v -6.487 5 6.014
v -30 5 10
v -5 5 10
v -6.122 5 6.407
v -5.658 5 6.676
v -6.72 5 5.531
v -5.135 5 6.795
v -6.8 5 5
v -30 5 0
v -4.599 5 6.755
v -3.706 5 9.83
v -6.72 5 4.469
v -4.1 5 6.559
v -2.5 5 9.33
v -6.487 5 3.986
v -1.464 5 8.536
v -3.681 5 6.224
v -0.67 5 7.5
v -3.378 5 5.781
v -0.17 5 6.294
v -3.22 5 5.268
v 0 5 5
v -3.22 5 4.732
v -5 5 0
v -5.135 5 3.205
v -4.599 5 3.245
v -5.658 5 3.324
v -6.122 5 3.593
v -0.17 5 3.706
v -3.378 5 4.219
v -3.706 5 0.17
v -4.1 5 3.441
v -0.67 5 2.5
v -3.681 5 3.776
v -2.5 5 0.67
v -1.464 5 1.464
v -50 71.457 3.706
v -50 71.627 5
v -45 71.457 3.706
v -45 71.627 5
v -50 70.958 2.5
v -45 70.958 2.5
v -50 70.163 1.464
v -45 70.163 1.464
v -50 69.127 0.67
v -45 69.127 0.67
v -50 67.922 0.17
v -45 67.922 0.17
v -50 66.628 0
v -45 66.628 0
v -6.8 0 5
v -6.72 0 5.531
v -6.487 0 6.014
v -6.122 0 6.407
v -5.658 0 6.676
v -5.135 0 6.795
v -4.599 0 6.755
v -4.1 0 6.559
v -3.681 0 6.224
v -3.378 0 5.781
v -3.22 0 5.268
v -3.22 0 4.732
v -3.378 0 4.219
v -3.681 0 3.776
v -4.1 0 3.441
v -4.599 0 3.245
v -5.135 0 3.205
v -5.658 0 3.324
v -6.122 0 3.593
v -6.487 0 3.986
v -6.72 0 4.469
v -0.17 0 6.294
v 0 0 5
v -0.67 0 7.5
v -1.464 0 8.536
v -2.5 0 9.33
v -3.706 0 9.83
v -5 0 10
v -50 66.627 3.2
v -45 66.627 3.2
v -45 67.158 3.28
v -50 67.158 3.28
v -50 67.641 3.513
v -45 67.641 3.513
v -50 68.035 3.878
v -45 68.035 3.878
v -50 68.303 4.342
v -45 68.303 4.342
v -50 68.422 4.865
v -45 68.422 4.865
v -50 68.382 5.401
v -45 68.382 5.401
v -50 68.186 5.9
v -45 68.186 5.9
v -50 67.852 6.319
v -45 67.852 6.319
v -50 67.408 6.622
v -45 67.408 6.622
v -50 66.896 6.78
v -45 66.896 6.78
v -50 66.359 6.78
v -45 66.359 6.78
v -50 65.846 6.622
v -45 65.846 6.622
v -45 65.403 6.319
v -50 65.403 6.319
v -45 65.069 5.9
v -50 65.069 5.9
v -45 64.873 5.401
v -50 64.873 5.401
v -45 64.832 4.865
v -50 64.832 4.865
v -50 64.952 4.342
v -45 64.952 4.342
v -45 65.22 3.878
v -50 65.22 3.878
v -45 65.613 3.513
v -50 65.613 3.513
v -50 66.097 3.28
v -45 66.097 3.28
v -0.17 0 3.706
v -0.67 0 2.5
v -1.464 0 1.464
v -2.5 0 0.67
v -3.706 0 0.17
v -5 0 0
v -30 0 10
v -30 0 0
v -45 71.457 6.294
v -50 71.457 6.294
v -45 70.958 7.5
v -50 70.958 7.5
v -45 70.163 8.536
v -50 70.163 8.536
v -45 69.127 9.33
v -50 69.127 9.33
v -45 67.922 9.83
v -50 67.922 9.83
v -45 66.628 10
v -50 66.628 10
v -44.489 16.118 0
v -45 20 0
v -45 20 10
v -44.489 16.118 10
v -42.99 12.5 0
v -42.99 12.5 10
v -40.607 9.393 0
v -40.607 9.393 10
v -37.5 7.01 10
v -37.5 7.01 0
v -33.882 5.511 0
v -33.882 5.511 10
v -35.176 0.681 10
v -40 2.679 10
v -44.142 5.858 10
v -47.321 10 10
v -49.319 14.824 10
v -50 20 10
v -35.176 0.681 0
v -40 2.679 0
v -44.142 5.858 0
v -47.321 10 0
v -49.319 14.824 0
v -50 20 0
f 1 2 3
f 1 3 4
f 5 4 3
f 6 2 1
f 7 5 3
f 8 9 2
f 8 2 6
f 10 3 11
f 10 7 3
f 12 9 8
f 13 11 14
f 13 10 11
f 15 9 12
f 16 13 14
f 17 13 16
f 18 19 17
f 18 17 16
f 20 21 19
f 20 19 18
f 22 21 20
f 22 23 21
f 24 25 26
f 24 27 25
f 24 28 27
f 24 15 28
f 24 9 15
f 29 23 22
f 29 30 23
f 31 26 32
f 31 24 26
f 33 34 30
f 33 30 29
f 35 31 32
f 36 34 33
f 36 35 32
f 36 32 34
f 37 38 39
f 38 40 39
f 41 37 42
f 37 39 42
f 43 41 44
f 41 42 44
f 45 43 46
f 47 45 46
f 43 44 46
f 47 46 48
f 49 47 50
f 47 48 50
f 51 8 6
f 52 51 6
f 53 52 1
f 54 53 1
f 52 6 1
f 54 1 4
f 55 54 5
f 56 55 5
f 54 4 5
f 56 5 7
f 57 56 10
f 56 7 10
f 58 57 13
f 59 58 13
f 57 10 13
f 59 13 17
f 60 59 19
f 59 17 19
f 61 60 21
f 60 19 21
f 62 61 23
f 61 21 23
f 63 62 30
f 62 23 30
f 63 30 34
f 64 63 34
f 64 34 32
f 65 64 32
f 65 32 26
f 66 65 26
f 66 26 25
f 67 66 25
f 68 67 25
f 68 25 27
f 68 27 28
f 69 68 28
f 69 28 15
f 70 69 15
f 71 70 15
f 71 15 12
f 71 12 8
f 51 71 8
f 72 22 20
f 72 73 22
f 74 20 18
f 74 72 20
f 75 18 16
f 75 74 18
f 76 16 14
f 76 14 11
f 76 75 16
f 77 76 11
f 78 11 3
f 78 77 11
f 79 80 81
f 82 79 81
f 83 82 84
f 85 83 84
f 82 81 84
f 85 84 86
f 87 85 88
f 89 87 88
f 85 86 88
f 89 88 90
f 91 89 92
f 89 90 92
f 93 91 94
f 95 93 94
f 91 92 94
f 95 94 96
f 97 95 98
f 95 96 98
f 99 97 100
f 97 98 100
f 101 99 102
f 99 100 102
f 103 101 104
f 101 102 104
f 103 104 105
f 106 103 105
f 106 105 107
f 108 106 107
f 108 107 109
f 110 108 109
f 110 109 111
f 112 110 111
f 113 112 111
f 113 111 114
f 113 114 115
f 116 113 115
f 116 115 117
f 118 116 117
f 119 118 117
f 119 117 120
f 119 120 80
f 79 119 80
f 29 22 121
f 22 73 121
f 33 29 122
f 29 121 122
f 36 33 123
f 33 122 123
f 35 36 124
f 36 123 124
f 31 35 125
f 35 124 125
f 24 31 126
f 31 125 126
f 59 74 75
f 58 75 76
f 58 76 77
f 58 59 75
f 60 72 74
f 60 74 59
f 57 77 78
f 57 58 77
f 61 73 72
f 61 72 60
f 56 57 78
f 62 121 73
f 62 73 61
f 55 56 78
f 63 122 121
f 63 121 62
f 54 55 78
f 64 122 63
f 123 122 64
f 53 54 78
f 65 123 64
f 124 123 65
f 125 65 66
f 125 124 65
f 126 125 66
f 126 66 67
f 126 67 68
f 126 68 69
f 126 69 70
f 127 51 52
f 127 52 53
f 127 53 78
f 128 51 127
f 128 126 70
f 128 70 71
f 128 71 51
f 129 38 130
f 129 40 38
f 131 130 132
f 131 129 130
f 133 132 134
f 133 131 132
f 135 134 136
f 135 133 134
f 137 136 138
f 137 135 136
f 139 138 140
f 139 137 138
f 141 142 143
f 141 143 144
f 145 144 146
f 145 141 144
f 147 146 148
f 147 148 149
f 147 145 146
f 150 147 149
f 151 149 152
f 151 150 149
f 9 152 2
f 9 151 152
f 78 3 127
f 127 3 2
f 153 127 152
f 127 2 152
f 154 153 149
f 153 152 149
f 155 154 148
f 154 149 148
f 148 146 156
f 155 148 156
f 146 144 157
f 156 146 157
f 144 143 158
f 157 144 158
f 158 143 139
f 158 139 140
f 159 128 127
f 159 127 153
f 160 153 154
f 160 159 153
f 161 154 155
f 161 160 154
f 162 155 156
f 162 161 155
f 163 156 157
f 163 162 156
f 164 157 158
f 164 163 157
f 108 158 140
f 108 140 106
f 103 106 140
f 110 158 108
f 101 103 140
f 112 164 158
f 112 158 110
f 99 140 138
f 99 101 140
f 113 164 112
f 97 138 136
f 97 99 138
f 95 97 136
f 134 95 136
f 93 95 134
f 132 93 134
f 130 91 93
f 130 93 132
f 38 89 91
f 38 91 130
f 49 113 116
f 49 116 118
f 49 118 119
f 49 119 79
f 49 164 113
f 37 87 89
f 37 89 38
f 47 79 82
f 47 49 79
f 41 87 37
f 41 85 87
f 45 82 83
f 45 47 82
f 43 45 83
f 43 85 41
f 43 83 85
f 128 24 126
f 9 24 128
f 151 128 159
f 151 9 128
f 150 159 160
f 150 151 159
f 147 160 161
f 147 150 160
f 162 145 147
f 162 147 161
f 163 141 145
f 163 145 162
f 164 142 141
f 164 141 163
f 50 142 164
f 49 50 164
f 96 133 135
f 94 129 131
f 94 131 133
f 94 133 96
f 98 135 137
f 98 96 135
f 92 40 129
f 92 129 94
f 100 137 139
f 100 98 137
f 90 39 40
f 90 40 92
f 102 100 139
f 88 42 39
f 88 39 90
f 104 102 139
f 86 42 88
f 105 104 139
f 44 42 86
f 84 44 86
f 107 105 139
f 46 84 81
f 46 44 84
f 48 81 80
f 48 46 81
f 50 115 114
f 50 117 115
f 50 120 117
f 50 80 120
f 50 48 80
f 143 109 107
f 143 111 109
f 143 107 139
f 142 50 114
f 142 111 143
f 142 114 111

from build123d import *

# Parameters (mm, degrees)
BOSS_EXTRUDE1_DEPTH  = 10
FILLET1_R            = 5
M3_CLEARANCE_HOLE1_D = 3.6
M3_CLEARANCE_HOLE2_D = 3.6


with BuildPart() as part:
    # Sketch3 → Boss-Extrude1 (new body)
    with BuildSketch(Plane.XY):
        with BuildLine():
            Line((0, 0), (-30, 0))
            ThreePointArc((-30, 0), (-44.142135624, 5.857864376), (-50, 20))
            Line((-50, 20), (-50, 71.627417))
            Line((-50, 71.627417), (-45, 71.627417))
            Line((-45, 71.627417), (-45, 20))
            ThreePointArc((-45, 20), (-40.606601718, 9.393398282), (-30, 5))
            Line((-30, 5), (0, 5))
            Line((0, 5), (0, 0))
        make_face()
    extrude(amount=BOSS_EXTRUDE1_DEPTH)

    # Fillet1
    fillet1_edges = [part.edges().sort_by_distance(p)[0] for p in [
        (0, 2.5, 10),
        (0, 2.5, 0),
        (-47.5, 71.627417, 0),
        (-47.5, 71.627417, 10),
    ]]
    fillet(fillet1_edges, radius=FILLET1_R - 0.0001)  # a hair under: the kernel refuses the full size

    # M3 Clearance Hole1 (through all)
    with Locations(Plane.XZ):
        with Locations((-5, 5)):
            Hole(M3_CLEARANCE_HOLE1_D / 2)

    # M3 Clearance Hole2 (through all)
    with Locations(Plane.ZY.offset(50)):
        with Locations((5, 66.627417)):
            Hole(M3_CLEARANCE_HOLE2_D / 2)


solid = part.part
